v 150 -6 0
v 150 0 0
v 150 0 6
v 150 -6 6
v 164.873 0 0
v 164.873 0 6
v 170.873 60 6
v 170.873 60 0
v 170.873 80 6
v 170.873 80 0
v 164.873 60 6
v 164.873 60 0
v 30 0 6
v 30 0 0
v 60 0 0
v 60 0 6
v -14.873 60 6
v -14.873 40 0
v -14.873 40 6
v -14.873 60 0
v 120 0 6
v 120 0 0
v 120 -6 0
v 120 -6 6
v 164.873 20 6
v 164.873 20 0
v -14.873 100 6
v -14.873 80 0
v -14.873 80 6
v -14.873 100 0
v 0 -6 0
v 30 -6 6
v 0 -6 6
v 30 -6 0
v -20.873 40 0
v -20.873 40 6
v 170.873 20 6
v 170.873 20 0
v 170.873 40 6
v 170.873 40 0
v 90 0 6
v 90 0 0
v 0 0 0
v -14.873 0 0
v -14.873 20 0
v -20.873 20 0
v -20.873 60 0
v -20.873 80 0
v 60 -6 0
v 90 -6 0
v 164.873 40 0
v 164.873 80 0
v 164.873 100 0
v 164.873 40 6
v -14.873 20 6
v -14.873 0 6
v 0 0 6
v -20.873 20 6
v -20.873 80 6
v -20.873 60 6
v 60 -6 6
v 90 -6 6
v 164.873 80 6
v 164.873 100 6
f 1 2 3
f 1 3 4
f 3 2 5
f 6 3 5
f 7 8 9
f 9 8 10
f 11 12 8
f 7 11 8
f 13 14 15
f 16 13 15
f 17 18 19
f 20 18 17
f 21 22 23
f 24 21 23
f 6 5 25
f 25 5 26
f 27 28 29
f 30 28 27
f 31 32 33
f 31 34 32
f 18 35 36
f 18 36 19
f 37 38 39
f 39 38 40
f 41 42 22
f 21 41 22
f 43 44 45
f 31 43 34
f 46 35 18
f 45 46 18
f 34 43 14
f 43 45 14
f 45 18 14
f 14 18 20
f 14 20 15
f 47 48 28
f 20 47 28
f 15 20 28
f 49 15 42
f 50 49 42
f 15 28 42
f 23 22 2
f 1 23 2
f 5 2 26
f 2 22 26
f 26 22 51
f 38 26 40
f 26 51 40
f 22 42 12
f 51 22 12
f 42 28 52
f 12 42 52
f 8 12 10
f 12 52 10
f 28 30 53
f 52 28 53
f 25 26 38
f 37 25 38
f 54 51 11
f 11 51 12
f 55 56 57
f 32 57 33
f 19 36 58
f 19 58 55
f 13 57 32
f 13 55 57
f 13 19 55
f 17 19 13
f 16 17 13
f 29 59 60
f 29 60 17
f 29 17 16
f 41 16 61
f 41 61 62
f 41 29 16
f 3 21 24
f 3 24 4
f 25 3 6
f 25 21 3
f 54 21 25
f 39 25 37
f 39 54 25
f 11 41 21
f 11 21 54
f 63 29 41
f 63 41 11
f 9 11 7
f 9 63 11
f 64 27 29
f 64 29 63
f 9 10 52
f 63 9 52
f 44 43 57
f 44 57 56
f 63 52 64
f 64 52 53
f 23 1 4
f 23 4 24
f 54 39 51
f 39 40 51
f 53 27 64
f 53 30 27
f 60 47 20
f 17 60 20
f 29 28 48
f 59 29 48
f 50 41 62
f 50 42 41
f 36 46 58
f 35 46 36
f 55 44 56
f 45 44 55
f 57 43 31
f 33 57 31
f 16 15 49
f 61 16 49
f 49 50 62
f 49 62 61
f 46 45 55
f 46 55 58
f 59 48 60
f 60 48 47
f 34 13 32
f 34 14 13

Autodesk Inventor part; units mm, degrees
ref_plane "YZ Plane" through (0, 0, 0) normal (1, 0, 0) x (0, 1, 0)
ref_plane "XZ Plane" through (0, 0, 0) normal (0, 1, 0) x (-1, 0, 0)
ref_plane "XY Plane" through (0, 0, 0) normal (0, 0, 1) x (1, 0, 0)
ref_plane "Work Plane1" through (0, 0, 0) normal (0, 0, 1) x (1, 0, 0)
sketch "Sketch1" plane through (0, 0, 0) normal (0, 0, 1) x (1, 0, 0)
  line L0 (0, 0) -> (30, 0)
  line L1 (0, 0) -> (0, -6)
  line L2 (30, -6) -> (0, -6)
  line L3 (30, 0) -> (30, -6)
  line L4 (60, 0) -> (90, 0)
  line L5 (60, 0) -> (60, -6)
  line L6 (90, -6) -> (60, -6)
  line L7 (90, 0) -> (90, -6)
  line L8 (120, 0) -> (150, 0)
  line L9 (120, 0) -> (120, -6)
  line L10 (150, -6) -> (120, -6)
  line L11 (150, 0) -> (150, -6)
  line L12 (30, 0) -> (60, 0)
  line L13 (90, 0) -> (120, 0)
  line L14 (150, 0) -> (164.8734, 0)
  line L15 (0, 0) -> (-14.8734, 0)
  line L16 (-20.8734, -6) -> (0, -6)
  line L17 (150, -6) -> (170.8734, -6)
  line L18 (0, 0) -> (0, -6)
  line L19 (30, -6) -> (0, -6)
  line L20 (30, -6) -> (30, 0)
  line L21 (60, 0) -> (60, -6)
  line L22 (90, -6) -> (60, -6)
  line L23 (90, -6) -> (90, 0)
  line L24 (120, 0) -> (120, -6)
  line L25 (120, -6) -> (150, -6)
  line L26 (150, 0) -> (150, -6)
  line L27 (164.8734, 0) -> (164.8734, 100)
  line L28 (-14.8734, 0) -> (-14.8734, 100)
  line L29 (-14.8734, 100) -> (164.8734, 100)
  line L30 (164.8734, 20) -> (170.8734, 20)
  line L31 (170.8734, 20) -> (170.8734, 40)
  line L32 (170.8734, 40) -> (164.8734, 40)
  line L33 (164.8734, 40) -> (164.8734, 20)
  line L34 (164.8734, 60) -> (170.8734, 60)
  line L35 (170.8734, 60) -> (170.8734, 80)
  line L36 (170.8734, 80) -> (164.8734, 80)
  line L37 (164.8734, 80) -> (164.8734, 60)
  line L38 (-14.8734, 80) -> (-20.8734, 80)
  line L39 (-20.8734, 80) -> (-20.8734, 60)
  line L40 (-20.8734, 60) -> (-14.8734, 60)
  line L41 (-14.8734, 60) -> (-14.8734, 80)
  line L42 (-14.8734, 20) -> (-20.8734, 20)
  line L43 (-20.8734, 20) -> (-20.8734, 40)
  line L44 (-20.8734, 40) -> (-14.8734, 40)
  line L45 (-14.8734, 40) -> (-14.8734, 20)
  dimension "d0" = 6
  dimension "d1" = 6
  dimension "d2" = 100
  dimension "d3" = 100
  dimension "d5" = 20
  dimension "d6" = 20
  dimension "d7" = 20
  dimension "d8" = 6
extrude "Plate1" add sketch "Sketch1" along normal blind 6
equation "\"d6\" = d5"
equation "\"d7\" = d5"
equation "\"d4\" = Thickness"
equation "\"BendRadius\" = Thickness"
equation "\"BendReliefWidth\" = Thickness"
equation "\"BendReliefDepth\" = 0.5 * Thickness"
equation "\"CornerReliefSize\" = 4 * Thickness"
equation "\"MinimumRemnant\" = 2 * Thickness"
equation "\"TransitionRadius\" = BendRadius"
equation "\"JacobiRadiusSize\" = BendRadius"
equation "\"GapSize\" = Thickness"
equation "\"Thickness\" = 6"
properties part number "zijkant2 electronica" material "Wood (Birch)"
